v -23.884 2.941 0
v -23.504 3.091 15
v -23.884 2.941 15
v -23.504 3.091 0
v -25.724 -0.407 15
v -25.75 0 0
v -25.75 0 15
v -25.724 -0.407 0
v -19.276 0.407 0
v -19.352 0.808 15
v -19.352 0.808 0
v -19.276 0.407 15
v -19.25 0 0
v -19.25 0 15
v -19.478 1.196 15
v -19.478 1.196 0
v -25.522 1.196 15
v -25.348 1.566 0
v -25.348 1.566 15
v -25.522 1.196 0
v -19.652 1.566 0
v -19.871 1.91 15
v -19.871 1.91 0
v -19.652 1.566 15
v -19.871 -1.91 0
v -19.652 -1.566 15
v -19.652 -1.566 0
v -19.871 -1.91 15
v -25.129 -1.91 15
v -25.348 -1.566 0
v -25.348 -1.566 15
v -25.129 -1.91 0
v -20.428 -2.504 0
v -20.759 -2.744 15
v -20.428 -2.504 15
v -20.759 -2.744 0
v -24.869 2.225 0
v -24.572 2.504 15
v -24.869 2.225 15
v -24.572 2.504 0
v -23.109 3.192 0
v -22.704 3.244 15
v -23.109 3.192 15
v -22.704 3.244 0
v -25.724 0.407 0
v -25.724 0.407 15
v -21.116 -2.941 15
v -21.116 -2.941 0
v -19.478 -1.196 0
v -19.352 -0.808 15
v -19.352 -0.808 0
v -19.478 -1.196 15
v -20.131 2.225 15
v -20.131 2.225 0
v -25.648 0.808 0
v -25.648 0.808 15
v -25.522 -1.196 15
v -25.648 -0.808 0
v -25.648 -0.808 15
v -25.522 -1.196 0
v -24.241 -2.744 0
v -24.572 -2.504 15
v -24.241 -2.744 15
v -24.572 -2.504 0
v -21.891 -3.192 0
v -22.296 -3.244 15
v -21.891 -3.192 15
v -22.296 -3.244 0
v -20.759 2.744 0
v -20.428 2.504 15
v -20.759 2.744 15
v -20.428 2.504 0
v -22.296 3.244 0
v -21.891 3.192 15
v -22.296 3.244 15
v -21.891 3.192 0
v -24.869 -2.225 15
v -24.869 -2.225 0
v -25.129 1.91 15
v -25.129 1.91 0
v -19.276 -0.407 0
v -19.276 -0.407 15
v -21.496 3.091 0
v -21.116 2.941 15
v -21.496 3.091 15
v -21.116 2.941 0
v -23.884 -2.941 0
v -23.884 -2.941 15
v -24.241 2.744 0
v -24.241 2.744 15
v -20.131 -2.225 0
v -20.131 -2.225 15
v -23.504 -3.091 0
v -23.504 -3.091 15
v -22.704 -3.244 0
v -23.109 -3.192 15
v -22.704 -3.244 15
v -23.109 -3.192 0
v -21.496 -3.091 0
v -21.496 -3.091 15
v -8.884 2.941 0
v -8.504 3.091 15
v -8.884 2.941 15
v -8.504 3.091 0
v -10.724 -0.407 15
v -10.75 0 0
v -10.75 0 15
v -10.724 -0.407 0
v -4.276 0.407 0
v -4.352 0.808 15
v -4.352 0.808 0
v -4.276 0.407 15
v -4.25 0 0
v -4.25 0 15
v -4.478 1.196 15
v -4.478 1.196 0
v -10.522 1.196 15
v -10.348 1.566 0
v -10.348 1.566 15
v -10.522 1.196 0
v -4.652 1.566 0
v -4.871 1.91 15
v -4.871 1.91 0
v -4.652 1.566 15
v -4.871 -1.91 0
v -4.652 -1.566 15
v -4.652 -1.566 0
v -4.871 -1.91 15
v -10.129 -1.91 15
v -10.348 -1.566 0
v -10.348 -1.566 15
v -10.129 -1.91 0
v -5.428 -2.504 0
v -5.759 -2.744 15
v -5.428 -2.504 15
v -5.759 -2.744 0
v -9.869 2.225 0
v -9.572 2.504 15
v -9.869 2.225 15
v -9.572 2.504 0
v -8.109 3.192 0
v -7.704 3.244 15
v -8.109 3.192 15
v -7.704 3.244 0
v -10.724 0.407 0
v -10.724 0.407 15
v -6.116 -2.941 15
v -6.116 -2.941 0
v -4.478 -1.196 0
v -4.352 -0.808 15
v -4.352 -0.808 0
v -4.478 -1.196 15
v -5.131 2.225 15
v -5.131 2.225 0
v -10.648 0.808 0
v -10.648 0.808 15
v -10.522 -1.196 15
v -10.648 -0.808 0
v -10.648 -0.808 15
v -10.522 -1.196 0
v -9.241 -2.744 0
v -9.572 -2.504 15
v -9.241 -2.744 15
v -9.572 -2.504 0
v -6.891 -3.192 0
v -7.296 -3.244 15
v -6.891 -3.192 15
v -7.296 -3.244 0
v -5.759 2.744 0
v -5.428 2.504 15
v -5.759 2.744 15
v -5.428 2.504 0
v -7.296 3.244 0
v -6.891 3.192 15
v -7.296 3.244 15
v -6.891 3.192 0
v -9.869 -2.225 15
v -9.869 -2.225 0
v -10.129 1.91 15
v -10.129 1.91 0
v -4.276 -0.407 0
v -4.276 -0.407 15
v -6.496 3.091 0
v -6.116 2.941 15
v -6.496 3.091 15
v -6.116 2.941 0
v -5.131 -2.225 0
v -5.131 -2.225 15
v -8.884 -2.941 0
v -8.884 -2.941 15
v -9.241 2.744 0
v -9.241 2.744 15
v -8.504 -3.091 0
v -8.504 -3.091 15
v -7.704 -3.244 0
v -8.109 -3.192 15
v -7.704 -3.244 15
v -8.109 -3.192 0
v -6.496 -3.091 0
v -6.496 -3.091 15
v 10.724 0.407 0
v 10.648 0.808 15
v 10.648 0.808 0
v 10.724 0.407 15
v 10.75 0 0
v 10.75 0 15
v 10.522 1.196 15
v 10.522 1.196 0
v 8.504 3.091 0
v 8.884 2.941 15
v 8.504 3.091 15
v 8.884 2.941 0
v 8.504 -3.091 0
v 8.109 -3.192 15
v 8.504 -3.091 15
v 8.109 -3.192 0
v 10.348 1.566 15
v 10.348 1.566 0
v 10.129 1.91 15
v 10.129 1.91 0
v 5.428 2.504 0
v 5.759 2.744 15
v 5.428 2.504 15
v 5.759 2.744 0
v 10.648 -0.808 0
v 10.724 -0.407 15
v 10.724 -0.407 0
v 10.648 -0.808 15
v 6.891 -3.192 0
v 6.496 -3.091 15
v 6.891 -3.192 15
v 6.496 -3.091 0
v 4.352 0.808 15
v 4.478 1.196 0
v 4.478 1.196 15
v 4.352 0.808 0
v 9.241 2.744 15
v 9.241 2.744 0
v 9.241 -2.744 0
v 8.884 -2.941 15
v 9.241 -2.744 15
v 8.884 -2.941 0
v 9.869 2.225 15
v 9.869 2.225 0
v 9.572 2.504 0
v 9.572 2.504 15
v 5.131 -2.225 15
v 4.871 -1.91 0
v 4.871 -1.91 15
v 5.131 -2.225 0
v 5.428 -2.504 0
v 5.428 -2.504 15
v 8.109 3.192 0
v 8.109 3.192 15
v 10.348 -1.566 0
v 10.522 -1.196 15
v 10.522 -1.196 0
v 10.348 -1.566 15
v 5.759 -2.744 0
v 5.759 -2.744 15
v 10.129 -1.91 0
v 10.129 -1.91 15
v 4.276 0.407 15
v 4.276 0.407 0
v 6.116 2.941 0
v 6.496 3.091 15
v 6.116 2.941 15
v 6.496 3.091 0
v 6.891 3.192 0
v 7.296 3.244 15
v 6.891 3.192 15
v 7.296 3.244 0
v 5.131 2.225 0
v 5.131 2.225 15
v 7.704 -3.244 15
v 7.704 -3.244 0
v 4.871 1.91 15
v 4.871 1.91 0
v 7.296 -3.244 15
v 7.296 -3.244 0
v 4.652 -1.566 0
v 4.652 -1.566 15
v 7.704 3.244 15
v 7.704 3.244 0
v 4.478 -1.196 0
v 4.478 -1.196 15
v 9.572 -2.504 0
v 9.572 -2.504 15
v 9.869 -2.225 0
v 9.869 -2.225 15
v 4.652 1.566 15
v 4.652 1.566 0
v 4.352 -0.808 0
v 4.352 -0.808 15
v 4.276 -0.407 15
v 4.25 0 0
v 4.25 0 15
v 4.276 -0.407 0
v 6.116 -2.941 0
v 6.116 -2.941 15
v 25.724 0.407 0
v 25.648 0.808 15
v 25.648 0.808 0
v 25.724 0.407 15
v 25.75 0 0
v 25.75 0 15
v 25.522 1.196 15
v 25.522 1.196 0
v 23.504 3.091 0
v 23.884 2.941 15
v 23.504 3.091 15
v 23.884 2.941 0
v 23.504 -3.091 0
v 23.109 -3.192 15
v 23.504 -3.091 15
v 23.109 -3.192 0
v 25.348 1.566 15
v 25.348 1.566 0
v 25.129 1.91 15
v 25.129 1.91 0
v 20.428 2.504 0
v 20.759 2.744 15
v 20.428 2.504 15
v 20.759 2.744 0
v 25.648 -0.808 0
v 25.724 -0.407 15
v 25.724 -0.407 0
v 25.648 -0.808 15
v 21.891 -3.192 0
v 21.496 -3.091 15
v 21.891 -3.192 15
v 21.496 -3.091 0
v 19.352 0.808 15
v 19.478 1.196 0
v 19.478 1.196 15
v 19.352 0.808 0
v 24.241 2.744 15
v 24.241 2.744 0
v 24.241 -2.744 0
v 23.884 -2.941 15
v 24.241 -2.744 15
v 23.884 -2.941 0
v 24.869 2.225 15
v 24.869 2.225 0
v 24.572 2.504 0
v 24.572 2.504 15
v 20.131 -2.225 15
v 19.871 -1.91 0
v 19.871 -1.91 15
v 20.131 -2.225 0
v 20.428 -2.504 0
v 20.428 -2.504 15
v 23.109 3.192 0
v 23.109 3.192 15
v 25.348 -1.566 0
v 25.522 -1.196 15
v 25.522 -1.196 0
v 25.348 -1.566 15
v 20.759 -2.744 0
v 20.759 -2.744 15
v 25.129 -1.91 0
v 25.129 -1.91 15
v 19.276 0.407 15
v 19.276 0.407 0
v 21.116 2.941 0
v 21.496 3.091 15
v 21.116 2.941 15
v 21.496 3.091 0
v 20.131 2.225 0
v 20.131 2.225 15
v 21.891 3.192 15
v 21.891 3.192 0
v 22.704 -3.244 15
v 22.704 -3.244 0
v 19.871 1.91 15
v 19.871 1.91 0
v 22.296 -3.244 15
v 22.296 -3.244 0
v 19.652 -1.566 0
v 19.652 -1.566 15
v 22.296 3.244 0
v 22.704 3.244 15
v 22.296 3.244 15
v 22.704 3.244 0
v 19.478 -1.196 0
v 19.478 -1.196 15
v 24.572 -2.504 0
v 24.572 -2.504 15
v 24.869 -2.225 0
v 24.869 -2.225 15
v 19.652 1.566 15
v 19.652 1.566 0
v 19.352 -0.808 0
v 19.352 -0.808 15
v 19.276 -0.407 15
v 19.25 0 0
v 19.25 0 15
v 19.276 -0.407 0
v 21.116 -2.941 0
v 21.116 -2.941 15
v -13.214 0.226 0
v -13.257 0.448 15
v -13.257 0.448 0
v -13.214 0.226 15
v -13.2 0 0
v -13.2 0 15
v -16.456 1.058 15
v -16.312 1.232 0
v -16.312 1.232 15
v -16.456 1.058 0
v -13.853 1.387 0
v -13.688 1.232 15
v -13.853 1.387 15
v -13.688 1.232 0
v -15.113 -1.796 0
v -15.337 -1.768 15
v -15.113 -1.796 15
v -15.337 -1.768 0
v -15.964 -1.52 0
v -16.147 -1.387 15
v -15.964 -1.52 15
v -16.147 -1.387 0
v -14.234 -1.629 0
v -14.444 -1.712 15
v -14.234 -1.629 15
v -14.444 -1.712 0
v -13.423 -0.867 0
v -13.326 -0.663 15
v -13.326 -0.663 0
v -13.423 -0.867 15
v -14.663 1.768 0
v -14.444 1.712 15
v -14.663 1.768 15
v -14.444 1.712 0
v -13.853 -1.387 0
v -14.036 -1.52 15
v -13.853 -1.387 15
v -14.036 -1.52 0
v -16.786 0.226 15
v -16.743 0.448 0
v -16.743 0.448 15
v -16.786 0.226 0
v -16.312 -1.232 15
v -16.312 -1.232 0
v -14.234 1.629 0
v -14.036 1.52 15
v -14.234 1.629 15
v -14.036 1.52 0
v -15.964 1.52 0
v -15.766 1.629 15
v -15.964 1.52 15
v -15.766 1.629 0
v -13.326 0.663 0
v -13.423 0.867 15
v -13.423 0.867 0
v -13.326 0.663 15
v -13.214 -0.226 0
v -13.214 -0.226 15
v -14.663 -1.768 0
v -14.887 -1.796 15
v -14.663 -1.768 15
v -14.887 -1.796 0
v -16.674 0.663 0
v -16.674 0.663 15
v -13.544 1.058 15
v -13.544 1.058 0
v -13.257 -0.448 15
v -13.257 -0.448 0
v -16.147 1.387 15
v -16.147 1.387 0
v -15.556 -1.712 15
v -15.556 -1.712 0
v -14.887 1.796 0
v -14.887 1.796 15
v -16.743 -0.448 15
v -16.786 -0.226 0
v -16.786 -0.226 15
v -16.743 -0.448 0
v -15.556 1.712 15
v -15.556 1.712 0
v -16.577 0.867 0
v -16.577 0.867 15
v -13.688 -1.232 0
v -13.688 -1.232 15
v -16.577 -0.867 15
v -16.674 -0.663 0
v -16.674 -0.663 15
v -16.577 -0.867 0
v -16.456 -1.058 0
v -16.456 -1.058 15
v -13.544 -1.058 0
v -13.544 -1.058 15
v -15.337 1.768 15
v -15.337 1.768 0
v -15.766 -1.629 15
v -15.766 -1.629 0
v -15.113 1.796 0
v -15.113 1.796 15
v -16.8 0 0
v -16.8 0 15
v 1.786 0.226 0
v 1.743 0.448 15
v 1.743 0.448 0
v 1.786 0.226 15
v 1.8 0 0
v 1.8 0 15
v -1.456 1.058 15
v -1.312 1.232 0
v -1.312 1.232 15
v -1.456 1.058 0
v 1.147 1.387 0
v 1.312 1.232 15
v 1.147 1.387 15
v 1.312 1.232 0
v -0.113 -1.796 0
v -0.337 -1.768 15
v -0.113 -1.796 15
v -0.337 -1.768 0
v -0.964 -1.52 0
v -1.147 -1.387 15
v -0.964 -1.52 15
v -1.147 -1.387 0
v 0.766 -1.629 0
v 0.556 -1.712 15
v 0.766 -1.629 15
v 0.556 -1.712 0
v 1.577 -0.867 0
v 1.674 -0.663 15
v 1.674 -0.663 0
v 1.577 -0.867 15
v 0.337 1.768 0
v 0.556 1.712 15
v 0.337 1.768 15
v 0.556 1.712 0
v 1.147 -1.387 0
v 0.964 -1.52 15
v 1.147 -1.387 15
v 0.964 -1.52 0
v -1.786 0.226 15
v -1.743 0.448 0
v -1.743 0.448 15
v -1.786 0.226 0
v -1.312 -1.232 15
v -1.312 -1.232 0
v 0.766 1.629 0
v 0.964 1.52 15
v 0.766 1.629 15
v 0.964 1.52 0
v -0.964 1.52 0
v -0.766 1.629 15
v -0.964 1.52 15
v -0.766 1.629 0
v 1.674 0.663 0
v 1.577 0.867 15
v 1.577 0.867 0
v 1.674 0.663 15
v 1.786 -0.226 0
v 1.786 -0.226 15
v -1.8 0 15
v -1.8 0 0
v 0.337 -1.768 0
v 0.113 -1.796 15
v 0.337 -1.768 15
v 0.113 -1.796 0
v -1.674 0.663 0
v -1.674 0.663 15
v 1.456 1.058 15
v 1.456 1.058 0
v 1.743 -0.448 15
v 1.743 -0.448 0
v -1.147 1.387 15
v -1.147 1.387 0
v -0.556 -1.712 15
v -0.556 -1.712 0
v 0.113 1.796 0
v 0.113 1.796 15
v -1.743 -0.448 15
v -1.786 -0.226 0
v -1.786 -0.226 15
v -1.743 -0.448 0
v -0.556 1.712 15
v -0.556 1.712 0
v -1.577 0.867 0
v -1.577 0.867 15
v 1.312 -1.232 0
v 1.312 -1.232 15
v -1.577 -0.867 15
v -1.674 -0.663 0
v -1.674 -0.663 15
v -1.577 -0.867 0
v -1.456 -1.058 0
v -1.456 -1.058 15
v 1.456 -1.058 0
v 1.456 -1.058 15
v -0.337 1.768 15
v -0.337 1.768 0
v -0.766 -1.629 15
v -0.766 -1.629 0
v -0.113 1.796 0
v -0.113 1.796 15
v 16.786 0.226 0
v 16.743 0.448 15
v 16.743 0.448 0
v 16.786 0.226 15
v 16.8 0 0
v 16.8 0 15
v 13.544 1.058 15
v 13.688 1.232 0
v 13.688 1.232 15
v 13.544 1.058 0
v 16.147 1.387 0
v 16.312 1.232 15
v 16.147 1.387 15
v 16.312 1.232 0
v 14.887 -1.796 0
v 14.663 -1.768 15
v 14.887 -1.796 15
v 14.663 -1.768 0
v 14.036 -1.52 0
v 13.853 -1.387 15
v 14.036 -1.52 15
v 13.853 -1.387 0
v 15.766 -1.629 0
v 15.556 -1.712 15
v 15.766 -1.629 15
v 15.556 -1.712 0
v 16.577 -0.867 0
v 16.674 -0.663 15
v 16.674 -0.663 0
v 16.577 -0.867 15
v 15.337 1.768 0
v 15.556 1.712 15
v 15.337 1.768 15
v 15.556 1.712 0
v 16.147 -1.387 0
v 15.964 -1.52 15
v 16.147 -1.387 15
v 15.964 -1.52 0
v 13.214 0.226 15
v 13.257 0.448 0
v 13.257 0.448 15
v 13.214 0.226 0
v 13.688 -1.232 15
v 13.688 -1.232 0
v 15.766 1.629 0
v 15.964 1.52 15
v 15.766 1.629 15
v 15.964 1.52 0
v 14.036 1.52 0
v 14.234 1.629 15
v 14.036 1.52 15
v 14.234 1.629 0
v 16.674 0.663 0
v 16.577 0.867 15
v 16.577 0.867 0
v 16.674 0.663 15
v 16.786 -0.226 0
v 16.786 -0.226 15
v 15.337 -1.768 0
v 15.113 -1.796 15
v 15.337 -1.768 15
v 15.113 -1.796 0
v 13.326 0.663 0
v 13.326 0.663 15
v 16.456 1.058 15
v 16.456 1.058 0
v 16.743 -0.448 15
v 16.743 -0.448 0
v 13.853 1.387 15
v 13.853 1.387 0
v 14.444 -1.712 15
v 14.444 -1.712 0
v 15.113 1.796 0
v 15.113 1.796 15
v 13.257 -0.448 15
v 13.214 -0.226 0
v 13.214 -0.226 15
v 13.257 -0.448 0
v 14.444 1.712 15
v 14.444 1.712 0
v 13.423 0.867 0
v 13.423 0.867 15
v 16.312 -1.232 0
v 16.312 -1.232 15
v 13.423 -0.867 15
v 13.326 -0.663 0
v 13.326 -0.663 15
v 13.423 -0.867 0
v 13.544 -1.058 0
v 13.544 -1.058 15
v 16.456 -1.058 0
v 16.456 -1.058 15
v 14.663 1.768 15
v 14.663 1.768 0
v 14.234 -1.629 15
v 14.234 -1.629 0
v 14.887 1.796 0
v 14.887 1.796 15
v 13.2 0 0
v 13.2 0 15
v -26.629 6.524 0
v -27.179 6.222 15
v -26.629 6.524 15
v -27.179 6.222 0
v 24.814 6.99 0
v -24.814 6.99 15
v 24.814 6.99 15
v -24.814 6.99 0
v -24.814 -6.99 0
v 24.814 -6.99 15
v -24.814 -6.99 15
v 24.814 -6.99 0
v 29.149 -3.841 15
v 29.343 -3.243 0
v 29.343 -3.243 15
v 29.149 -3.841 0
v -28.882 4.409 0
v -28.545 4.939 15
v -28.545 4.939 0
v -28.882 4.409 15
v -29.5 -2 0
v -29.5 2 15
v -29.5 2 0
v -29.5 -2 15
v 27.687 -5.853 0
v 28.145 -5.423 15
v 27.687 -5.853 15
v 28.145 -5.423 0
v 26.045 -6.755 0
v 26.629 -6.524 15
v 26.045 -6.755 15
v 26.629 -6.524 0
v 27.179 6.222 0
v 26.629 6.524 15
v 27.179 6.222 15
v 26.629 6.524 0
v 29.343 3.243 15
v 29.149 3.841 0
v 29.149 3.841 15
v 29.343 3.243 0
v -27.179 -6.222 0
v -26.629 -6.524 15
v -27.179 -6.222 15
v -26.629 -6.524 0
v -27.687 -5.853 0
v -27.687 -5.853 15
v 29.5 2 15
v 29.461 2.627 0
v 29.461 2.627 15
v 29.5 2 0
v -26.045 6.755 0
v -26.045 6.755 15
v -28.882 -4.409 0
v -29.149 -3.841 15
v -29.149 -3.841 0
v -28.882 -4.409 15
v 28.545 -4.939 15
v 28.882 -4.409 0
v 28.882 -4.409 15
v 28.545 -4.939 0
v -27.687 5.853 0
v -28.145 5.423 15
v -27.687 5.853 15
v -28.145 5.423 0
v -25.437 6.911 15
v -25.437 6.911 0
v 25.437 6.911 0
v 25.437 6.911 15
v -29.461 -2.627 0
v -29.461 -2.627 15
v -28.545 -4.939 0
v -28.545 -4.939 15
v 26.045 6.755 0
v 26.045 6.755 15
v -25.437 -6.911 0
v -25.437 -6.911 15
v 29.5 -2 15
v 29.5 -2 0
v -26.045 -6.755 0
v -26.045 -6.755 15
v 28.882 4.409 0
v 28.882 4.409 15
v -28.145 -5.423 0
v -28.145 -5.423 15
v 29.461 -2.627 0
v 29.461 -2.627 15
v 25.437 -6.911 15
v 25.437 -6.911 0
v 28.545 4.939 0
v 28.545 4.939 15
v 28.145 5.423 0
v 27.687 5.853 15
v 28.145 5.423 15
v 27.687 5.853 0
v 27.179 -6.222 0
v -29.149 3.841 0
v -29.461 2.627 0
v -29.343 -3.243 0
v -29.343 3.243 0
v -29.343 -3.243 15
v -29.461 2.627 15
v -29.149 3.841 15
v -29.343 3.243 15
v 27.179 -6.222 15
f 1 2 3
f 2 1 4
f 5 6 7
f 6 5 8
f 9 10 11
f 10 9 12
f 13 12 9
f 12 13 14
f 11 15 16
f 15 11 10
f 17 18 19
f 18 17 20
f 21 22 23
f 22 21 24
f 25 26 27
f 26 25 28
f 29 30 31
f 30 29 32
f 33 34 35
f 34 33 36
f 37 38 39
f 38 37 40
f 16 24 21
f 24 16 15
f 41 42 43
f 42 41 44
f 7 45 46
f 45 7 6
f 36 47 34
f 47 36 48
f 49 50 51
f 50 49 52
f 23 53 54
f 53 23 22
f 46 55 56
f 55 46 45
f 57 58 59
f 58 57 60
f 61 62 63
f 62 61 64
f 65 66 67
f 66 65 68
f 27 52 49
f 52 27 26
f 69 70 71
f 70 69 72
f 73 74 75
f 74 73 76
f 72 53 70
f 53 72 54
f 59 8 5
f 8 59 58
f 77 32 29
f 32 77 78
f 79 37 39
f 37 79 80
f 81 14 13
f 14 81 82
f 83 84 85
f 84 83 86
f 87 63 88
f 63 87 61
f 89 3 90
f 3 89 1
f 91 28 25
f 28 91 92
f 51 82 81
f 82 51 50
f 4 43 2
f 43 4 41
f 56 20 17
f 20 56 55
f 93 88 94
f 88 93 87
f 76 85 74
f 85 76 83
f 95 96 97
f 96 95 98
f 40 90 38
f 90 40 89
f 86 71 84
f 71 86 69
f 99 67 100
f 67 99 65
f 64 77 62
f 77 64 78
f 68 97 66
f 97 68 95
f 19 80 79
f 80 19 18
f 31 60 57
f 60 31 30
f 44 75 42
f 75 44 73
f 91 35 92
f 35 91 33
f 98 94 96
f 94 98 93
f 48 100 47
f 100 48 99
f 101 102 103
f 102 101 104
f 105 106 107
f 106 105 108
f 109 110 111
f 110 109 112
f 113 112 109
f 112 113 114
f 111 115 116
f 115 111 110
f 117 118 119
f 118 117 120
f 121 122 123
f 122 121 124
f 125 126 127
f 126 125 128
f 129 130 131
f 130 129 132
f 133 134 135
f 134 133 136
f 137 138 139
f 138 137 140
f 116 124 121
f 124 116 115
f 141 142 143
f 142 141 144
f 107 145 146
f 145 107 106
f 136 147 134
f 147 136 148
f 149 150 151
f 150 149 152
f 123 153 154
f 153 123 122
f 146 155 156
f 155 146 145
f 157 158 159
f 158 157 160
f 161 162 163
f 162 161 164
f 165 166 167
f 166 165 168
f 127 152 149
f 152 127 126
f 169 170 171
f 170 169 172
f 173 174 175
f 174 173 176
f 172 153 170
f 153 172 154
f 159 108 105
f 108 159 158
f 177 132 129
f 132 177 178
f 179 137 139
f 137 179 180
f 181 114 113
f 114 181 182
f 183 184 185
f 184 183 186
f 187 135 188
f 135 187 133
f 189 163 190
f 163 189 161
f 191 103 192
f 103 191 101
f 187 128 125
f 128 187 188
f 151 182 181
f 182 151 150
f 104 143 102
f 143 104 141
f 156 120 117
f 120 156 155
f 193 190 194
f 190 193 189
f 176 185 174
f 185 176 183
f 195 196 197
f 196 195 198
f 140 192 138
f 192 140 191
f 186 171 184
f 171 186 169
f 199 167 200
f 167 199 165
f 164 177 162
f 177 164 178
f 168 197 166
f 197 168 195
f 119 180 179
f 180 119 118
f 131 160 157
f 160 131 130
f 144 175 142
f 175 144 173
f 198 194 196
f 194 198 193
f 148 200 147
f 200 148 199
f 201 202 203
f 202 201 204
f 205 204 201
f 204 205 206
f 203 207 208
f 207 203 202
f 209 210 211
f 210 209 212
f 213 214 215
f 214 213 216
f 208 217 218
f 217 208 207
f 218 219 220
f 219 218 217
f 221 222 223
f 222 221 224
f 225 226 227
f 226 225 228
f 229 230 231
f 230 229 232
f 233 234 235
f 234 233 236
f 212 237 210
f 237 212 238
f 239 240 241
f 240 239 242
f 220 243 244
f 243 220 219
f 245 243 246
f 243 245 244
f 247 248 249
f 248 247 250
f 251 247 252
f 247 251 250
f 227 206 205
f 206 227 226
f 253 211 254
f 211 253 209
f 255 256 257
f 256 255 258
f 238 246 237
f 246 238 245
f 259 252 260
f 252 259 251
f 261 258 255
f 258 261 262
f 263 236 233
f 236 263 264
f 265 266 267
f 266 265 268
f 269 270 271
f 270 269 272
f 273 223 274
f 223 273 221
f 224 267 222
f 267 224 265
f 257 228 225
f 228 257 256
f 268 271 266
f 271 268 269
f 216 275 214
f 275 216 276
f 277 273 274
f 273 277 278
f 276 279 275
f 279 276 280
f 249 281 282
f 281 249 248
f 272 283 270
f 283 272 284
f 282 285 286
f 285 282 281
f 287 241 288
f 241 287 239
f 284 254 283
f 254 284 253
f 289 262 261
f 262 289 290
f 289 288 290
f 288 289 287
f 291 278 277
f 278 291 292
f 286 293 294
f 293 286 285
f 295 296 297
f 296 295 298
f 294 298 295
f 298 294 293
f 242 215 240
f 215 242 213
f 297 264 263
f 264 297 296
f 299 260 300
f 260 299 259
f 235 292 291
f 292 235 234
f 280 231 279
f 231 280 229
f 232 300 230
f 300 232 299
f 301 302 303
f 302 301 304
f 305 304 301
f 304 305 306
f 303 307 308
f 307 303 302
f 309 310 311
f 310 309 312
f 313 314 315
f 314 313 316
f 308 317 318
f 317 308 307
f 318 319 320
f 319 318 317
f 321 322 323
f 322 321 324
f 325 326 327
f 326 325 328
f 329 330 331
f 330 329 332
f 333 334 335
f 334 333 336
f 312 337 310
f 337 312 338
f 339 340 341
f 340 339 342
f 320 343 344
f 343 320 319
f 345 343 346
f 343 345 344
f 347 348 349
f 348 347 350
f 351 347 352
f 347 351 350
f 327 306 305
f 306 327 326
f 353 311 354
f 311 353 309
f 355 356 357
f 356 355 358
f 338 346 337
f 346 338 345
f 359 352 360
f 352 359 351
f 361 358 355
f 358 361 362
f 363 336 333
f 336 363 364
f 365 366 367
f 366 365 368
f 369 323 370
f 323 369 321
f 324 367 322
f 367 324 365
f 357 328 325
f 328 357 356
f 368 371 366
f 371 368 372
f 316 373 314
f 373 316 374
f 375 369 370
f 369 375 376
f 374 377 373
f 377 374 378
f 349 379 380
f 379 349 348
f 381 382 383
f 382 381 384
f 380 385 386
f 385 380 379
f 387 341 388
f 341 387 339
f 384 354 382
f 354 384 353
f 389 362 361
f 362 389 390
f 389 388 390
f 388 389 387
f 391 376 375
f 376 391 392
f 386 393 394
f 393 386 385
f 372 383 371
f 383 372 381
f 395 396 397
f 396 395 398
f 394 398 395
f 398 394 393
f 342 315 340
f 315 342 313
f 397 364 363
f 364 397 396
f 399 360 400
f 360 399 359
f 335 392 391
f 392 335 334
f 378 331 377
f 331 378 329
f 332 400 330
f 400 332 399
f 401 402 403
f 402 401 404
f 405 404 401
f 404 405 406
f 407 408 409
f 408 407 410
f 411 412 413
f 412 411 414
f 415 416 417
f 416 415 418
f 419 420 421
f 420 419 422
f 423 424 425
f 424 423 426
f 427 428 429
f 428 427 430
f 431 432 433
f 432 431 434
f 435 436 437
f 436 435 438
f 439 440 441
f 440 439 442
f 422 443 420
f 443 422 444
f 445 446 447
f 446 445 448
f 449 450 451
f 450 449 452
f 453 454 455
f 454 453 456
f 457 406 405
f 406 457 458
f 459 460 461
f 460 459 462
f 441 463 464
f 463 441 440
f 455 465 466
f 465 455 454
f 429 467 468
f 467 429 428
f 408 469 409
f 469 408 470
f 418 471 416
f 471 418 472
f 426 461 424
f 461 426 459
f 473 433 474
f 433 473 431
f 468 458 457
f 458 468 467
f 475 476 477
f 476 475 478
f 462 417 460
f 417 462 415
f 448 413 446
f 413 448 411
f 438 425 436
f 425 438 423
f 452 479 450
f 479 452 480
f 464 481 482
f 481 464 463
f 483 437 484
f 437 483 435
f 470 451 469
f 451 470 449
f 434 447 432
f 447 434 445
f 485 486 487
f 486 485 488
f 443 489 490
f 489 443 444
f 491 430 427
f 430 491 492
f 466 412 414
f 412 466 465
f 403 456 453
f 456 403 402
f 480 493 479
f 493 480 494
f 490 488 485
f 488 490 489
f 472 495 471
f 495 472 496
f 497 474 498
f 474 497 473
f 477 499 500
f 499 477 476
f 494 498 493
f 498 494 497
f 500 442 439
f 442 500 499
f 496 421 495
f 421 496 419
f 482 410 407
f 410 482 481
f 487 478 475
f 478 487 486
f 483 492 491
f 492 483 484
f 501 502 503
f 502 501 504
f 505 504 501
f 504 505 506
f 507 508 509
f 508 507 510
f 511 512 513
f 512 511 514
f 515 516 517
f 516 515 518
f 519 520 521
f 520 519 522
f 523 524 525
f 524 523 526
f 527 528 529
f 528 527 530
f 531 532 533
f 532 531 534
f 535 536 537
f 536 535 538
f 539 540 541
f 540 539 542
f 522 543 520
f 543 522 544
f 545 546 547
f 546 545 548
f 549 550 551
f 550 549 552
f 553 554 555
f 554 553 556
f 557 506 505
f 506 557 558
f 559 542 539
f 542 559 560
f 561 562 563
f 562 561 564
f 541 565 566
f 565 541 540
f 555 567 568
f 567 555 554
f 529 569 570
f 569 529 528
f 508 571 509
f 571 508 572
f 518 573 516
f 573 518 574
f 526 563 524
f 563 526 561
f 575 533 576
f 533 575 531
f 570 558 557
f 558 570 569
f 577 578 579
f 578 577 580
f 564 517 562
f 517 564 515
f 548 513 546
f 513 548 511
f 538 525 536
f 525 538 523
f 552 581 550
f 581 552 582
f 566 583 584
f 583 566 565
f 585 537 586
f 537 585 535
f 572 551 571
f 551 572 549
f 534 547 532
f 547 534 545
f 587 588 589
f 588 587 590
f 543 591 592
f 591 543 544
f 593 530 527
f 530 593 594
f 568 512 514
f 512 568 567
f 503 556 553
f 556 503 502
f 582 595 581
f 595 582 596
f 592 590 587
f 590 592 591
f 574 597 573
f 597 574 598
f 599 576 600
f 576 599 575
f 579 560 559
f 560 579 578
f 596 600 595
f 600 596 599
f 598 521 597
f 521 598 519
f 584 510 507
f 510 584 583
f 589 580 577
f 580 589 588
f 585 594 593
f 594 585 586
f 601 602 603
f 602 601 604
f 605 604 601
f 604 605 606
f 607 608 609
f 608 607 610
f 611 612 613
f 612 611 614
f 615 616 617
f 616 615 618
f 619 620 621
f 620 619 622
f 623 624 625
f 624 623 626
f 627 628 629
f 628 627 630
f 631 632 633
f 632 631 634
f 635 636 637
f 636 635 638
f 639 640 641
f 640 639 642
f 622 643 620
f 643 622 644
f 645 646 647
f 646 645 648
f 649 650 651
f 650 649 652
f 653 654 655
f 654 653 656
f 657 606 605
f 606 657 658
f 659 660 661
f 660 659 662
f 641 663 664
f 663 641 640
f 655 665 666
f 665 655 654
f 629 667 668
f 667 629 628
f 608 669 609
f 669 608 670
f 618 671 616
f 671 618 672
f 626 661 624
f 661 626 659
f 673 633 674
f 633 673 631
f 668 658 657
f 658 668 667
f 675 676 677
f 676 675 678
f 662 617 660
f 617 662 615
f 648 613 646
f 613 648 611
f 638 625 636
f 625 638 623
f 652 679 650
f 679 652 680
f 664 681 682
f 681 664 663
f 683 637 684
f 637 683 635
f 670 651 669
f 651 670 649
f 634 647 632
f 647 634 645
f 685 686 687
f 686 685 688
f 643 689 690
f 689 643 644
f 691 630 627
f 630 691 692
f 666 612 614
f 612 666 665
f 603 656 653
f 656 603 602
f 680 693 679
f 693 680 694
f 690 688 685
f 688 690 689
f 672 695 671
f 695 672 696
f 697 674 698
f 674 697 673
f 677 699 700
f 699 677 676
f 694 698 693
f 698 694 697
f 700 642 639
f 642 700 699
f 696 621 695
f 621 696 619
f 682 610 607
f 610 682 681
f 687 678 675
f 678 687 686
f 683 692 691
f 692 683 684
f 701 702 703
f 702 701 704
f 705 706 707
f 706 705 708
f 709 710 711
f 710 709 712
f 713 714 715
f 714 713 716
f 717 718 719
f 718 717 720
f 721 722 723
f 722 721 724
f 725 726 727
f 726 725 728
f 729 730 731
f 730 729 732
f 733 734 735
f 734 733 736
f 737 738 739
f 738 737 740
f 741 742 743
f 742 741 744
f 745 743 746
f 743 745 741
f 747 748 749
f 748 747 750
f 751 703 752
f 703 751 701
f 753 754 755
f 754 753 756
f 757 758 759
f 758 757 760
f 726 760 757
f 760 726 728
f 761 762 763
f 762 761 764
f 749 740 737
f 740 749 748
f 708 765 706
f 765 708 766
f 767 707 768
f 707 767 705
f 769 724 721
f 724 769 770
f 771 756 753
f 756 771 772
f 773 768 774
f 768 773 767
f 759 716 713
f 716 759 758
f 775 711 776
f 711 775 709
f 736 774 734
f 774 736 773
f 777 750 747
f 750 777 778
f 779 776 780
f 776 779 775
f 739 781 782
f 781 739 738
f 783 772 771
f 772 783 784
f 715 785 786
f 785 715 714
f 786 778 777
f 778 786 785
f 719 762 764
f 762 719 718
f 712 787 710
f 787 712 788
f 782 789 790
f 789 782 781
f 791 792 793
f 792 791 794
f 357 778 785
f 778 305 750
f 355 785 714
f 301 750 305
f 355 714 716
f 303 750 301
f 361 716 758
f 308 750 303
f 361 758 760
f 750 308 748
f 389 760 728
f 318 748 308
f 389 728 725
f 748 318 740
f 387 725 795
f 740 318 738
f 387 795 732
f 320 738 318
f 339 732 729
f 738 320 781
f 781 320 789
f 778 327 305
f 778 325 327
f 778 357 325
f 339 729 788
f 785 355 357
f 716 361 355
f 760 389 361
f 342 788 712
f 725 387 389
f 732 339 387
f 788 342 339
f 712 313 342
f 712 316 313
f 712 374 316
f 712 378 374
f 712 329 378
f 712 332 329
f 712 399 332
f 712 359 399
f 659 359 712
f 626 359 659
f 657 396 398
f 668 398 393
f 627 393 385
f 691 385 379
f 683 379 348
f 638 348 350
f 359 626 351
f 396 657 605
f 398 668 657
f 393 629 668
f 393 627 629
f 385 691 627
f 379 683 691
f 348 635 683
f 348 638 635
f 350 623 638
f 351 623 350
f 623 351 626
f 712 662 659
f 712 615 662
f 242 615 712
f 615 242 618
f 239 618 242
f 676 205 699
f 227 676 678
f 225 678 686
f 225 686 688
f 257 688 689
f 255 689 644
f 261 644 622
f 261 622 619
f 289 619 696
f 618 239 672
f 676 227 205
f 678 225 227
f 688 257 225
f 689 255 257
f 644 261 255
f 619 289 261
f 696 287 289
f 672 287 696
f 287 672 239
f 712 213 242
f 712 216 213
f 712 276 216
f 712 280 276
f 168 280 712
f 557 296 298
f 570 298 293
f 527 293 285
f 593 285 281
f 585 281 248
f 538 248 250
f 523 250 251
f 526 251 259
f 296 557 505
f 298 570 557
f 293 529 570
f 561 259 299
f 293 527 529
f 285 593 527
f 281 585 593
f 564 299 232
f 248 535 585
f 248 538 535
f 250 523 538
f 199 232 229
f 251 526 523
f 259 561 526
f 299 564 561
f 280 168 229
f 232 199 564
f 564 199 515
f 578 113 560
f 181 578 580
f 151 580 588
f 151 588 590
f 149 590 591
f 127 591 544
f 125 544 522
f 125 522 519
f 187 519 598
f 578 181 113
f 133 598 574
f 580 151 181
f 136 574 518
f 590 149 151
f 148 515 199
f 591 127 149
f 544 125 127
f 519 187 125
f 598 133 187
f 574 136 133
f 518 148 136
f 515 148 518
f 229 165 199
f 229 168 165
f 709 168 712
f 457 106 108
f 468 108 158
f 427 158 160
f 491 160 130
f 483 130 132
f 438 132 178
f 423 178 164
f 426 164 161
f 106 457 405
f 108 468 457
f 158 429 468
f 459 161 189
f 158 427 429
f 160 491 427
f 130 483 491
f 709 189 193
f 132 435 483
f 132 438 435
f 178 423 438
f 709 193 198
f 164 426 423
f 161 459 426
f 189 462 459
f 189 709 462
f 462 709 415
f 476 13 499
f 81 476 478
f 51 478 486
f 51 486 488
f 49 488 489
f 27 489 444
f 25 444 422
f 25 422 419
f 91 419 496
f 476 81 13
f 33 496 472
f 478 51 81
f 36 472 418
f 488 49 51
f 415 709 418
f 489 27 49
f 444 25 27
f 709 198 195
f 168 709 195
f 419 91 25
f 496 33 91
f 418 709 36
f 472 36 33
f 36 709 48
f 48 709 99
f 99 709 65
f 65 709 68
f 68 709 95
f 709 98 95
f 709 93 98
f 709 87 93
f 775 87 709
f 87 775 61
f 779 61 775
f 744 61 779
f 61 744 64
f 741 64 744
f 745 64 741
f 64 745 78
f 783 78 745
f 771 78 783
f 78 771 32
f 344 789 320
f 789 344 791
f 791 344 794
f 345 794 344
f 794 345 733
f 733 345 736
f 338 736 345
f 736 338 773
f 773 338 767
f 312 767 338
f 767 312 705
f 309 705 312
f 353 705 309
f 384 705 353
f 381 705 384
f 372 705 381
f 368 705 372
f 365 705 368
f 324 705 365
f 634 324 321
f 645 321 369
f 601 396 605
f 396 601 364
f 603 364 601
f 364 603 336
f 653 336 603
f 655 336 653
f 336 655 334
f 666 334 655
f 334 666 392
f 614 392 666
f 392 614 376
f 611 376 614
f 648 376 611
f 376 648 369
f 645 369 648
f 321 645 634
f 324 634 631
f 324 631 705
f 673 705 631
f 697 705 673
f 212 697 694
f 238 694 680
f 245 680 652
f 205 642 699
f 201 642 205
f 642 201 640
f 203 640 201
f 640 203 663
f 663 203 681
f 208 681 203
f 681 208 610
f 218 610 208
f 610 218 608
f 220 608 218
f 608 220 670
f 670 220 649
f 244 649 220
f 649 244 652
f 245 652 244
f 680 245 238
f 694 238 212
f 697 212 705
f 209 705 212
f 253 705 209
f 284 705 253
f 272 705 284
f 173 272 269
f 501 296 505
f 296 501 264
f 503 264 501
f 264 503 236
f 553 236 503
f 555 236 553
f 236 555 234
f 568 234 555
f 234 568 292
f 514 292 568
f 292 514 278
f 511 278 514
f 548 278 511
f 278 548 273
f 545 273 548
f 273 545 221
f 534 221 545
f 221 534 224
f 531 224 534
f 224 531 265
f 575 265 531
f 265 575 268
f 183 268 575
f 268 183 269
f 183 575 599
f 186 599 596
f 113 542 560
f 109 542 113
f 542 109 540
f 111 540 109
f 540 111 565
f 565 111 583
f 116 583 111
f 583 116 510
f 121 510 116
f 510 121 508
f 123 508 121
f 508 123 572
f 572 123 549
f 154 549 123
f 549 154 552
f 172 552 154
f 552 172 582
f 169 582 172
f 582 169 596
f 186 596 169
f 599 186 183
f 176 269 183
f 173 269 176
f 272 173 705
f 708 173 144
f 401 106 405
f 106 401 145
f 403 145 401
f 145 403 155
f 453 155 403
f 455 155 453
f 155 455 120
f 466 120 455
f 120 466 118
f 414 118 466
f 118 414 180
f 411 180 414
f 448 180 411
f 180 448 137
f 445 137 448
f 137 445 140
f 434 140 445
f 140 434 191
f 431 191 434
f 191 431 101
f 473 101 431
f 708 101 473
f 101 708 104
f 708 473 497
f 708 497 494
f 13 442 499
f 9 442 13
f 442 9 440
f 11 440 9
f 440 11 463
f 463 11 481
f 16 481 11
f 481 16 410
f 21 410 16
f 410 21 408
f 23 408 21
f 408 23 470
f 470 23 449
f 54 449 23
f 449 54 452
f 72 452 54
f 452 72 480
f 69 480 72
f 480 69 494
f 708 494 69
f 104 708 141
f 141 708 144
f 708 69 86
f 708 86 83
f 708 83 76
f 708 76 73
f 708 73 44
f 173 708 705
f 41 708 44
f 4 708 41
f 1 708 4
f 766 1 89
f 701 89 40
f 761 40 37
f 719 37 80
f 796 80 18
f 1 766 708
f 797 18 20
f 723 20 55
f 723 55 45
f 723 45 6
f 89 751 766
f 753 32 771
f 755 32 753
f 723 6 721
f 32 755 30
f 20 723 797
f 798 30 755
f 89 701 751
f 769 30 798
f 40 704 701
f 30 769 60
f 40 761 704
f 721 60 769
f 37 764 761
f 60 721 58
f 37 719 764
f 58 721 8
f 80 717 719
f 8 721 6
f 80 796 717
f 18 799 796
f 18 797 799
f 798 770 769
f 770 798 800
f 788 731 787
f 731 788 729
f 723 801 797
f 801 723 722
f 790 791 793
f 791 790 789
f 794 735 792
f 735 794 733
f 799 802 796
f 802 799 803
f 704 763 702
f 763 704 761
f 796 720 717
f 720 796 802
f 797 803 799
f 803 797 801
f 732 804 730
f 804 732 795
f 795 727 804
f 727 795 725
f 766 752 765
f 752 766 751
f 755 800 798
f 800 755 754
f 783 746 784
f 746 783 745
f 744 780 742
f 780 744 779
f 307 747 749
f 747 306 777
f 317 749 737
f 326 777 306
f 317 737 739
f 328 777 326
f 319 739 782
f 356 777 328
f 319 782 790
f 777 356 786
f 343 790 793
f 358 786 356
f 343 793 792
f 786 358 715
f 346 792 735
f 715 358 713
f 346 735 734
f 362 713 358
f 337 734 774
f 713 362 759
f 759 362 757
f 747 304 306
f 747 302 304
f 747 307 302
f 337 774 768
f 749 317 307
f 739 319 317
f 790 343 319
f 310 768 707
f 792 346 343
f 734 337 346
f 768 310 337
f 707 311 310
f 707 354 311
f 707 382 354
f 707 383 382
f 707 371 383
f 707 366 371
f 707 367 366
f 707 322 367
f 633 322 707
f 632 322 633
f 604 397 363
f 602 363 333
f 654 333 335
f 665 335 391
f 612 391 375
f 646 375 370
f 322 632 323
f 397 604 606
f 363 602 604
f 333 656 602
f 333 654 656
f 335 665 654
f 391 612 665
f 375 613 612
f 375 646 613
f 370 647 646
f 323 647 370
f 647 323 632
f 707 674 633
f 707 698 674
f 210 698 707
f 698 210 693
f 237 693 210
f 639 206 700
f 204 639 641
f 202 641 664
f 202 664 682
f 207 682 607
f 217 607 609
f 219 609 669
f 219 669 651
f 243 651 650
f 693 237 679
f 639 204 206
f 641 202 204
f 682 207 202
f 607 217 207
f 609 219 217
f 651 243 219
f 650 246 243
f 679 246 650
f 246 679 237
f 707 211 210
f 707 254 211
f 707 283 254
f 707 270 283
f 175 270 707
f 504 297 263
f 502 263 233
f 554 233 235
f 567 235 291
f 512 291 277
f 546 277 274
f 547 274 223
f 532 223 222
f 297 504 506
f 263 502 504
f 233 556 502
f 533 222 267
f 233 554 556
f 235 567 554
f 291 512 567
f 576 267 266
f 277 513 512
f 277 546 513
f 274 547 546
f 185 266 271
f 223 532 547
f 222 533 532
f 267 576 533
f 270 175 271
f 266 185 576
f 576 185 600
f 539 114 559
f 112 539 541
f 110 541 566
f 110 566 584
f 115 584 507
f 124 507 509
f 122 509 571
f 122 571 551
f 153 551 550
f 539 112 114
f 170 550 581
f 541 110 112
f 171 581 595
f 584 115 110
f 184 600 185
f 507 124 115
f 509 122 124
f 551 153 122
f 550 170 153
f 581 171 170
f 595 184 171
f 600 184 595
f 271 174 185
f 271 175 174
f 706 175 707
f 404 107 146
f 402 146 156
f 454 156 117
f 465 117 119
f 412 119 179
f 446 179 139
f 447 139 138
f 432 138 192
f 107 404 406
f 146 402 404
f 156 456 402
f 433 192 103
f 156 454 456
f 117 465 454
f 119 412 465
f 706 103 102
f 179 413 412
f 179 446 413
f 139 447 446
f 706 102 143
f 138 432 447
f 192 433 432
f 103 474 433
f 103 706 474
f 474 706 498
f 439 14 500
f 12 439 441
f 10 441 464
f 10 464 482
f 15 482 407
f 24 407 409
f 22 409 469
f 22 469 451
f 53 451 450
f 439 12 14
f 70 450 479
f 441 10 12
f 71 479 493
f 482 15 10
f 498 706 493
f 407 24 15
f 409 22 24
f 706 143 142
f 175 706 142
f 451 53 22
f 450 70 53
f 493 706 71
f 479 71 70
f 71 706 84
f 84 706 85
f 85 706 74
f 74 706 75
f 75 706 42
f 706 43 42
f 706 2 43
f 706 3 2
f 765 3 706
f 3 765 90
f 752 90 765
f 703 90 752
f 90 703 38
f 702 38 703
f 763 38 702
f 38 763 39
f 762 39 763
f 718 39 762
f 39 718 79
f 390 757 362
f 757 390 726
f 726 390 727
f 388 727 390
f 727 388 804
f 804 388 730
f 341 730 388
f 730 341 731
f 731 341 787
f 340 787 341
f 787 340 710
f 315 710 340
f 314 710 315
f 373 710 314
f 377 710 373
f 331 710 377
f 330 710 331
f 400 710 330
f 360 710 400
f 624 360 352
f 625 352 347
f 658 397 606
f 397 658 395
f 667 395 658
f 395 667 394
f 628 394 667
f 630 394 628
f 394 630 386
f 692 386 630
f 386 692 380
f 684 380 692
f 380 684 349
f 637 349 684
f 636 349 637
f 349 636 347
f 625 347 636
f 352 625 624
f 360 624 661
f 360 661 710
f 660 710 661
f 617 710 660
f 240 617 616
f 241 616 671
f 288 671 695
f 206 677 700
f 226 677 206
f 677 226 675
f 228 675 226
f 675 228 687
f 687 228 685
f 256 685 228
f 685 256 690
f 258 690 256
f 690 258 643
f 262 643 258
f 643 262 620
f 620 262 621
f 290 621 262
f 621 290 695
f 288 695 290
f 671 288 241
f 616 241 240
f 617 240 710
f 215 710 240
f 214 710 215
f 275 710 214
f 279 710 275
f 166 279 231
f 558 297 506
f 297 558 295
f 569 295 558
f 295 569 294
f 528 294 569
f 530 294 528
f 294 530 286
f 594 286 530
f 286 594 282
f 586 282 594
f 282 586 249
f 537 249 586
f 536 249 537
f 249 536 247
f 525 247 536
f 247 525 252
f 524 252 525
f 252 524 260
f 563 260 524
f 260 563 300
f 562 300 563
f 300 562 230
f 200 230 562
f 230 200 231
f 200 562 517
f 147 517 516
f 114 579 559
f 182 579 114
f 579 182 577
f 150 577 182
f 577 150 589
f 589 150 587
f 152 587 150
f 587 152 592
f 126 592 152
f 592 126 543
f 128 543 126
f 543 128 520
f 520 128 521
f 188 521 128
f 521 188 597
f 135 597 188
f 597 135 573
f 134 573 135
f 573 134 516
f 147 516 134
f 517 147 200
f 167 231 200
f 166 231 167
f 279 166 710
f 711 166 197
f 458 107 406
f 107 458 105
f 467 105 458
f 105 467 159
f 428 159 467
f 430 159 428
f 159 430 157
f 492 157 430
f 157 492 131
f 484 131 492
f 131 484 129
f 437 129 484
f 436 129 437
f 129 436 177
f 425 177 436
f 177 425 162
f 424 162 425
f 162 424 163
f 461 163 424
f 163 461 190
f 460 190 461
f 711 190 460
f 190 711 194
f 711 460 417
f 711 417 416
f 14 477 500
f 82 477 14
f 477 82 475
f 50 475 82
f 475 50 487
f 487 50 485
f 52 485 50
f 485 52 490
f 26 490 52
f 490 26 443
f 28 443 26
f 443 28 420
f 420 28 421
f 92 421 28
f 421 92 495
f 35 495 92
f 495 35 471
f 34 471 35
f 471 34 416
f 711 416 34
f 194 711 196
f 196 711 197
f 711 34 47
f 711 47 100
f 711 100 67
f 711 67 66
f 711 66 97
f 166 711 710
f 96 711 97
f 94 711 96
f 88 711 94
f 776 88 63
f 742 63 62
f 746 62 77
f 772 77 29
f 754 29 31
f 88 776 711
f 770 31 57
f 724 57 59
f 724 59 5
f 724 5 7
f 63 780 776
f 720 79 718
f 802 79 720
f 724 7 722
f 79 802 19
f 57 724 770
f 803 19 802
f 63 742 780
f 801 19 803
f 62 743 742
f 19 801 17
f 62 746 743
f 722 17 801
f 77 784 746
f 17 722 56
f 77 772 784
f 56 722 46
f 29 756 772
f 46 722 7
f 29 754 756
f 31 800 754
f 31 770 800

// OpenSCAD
$fn = 50;


difference() {
	union() {
		*color(alpha = 1.0000000000, c = "gray") {
			translate(v = [0, 7, 0]) {
				linear_extrude(height = 1) {
					text(font = "Arial:style=Bold", halign = "center", size = 4.5000000000, text = "COMMENT plate main", valign = "center");
				}
			}
		}
		*color(alpha = 1.0000000000, c = "gray") {
			translate(v = [0, 14, 0]) {
				linear_extrude(height = 1) {
					text(font = "Arial:style=Bold", halign = "center", size = 4.5000000000, text = "COMMENT description oobb_plate_shape_p_type_15_depth_4_width_1_height_15_thickness_true_both_holes", valign = "center");
				}
			}
		}
		hull() {
			translate(v = [-24.5000000000, 2.0000000000, 0]) {
				cylinder(h = 15, r = 5);
			}
			translate(v = [24.5000000000, 2.0000000000, 0]) {
				cylinder(h = 15, r = 5);
			}
			translate(v = [-24.5000000000, -2.0000000000, 0]) {
				cylinder(h = 15, r = 5);
			}
			translate(v = [24.5000000000, -2.0000000000, 0]) {
				cylinder(h = 15, r = 5);
			}
		}
	}
	union() {
		*color(alpha = 1.0000000000, c = "gray") {
			translate(v = [0, 7, 0]) {
				linear_extrude(height = 1) {
					text(font = "Arial:style=Bold", halign = "center", size = 4.5000000000, text = "COMMENT holes main", valign = "center");
				}
			}
		}
		*color(alpha = 1.0000000000, c = "gray") {
			translate(v = [0, 14, 0]) {
				linear_extrude(height = 1) {
					text(font = "Arial:style=Bold", halign = "center", size = 4.5000000000, text = "COMMENT description oobb_holes_shape_n_type_4_width_1_height_15_thickness_true_both_holes", valign = "center");
				}
			}
		}
		translate(v = [-22.5000000000, 0.0000000000, 0]) {
			translate(v = [0, 0, -50]) {
				cylinder(h = 100, r = 3.2500000000);
			}
		}
		translate(v = [-7.5000000000, 0.0000000000, 0]) {
			translate(v = [0, 0, -50]) {
				cylinder(h = 100, r = 3.2500000000);
			}
		}
		translate(v = [7.5000000000, 0.0000000000, 0]) {
			translate(v = [0, 0, -50]) {
				cylinder(h = 100, r = 3.2500000000);
			}
		}
		translate(v = [22.5000000000, 0.0000000000, 0]) {
			translate(v = [0, 0, -50]) {
				cylinder(h = 100, r = 3.2500000000);
			}
		}
		translate(v = [-22.5000000000, 0.0000000000, 0]) {
			translate(v = [0, 0, -50]) {
				cylinder(h = 100, r = 1.8000000000);
			}
		}
		translate(v = [-15.0000000000, 0.0000000000, 0]) {
			translate(v = [0, 0, -50]) {
				cylinder(h = 100, r = 1.8000000000);
			}
		}
		translate(v = [-7.5000000000, 0.0000000000, 0]) {
			translate(v = [0, 0, -50]) {
				cylinder(h = 100, r = 1.8000000000);
			}
		}
		translate(v = [0, 0, -50]) {
			cylinder(h = 100, r = 1.8000000000);
		}
		translate(v = [7.5000000000, 0.0000000000, 0]) {
			translate(v = [0, 0, -50]) {
				cylinder(h = 100, r = 1.8000000000);
			}
		}
		translate(v = [15.0000000000, 0.0000000000, 0]) {
			translate(v = [0, 0, -50]) {
				cylinder(h = 100, r = 1.8000000000);
			}
		}
		translate(v = [22.5000000000, 0.0000000000, 0]) {
			translate(v = [0, 0, -50]) {
				cylinder(h = 100, r = 1.8000000000);
			}
		}
	}
}
